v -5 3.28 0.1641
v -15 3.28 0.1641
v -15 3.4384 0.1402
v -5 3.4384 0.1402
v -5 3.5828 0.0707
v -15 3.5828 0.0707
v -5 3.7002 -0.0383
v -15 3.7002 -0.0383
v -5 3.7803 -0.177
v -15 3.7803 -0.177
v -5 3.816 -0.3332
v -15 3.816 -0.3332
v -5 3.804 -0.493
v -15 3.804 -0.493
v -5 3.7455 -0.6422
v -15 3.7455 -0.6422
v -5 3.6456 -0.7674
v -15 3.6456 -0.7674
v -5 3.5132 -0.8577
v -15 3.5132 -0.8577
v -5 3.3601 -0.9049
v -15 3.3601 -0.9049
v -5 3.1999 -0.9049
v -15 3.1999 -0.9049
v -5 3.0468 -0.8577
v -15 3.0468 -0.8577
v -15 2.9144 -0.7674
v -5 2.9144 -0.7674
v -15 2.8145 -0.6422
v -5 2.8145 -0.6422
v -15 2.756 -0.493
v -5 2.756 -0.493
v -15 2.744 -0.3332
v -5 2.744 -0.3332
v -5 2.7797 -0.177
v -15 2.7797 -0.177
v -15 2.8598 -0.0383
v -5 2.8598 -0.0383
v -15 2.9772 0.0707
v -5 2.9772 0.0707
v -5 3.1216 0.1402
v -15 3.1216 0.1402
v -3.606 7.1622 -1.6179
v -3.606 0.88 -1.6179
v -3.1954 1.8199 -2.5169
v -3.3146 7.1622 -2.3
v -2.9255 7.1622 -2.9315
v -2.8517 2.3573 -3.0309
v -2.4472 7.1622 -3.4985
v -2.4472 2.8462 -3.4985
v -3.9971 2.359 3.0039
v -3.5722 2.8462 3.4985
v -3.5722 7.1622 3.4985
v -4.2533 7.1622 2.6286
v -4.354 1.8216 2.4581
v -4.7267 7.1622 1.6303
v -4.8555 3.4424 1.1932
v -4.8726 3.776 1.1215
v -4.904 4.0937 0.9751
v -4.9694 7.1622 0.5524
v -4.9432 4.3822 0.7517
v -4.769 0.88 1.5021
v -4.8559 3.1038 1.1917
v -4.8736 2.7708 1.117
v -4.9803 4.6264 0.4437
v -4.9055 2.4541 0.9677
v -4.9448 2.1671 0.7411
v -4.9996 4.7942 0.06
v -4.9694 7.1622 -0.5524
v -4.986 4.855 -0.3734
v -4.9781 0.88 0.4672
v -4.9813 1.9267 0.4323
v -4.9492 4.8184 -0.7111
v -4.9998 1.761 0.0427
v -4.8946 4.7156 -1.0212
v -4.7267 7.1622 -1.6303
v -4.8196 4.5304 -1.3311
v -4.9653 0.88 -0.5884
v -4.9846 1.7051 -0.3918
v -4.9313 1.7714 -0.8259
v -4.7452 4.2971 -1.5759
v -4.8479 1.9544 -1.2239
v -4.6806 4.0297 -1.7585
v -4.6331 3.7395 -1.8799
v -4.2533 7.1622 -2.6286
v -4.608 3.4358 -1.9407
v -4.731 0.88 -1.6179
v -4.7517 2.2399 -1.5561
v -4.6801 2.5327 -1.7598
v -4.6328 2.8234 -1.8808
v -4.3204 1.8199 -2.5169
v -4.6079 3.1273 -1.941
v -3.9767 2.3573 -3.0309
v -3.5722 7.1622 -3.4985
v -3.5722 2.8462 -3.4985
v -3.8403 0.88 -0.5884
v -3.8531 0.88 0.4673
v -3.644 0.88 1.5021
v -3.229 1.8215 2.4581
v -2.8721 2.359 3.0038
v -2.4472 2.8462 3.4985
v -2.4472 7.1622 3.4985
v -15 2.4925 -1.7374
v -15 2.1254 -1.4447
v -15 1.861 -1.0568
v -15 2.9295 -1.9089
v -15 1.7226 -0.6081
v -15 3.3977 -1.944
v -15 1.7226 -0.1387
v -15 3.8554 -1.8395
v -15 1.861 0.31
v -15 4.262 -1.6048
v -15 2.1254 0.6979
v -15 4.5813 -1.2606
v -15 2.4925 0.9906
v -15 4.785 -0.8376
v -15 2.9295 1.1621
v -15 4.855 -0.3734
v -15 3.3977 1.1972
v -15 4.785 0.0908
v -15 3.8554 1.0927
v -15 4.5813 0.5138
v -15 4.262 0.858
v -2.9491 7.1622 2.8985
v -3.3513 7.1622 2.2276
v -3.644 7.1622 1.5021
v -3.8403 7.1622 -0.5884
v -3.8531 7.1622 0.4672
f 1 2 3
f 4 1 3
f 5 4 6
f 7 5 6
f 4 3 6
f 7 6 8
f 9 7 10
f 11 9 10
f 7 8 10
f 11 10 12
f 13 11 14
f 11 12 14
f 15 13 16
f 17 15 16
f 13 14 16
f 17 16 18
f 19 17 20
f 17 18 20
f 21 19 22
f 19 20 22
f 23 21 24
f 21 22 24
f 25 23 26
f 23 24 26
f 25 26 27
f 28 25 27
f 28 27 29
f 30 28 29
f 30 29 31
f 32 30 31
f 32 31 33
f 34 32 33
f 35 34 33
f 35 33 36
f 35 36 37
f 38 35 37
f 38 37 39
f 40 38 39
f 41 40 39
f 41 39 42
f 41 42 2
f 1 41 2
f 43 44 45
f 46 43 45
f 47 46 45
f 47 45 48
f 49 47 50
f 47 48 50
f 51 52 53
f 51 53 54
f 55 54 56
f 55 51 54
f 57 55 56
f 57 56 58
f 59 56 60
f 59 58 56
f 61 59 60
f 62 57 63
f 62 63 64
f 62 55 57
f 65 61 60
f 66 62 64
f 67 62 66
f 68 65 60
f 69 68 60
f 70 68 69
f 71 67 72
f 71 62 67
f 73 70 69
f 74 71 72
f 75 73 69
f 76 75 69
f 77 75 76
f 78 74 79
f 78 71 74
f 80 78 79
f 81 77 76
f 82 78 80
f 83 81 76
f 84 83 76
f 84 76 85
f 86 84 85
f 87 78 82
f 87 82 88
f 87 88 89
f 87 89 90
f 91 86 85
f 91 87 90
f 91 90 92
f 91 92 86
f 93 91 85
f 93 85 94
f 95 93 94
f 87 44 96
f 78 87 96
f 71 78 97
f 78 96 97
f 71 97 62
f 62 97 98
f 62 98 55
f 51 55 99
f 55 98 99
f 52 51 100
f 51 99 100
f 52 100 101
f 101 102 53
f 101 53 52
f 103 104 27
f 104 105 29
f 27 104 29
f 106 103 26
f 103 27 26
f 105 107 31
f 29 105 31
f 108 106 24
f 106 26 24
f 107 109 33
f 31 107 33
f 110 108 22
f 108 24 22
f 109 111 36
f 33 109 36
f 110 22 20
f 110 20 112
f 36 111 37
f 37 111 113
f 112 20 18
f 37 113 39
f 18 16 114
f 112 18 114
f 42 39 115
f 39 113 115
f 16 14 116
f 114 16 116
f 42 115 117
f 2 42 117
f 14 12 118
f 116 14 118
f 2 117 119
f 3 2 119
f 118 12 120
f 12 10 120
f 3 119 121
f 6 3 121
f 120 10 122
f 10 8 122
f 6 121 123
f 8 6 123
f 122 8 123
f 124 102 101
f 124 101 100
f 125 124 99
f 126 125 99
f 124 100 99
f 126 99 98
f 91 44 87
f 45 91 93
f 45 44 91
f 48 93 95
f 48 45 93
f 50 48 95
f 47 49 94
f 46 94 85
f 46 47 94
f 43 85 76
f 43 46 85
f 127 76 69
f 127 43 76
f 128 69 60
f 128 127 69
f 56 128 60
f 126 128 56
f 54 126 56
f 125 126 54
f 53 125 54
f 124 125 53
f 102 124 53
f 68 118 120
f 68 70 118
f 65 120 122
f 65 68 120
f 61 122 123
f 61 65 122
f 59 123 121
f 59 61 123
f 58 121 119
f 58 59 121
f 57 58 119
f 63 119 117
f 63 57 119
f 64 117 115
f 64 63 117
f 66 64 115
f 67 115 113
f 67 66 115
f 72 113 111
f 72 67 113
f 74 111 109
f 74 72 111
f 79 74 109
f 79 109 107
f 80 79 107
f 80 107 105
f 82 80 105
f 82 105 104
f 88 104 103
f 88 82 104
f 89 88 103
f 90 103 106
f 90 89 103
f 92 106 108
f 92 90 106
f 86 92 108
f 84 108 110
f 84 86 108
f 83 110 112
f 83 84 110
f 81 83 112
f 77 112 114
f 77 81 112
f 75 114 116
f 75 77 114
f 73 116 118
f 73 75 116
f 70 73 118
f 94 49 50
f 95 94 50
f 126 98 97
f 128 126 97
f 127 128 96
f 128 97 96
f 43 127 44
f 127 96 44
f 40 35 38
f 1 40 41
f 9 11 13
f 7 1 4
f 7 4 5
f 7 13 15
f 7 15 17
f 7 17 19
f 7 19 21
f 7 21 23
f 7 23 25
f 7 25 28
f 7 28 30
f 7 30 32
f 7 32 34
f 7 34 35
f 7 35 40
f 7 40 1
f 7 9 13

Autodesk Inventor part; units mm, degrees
ref_plane "YZ Plane" through (0, 0, 0) normal (1, 0, 0) x (0, 1, 0)
ref_plane "XZ Plane" through (0, 0, 0) normal (0, 1, 0) x (-1, 0, 0)
ref_plane "XY Plane" through (0, 0, 0) normal (0, 0, 1) x (1, 0, 0)
sketch "Sketch1" plane through (0, 0, 0) normal (0, 1, 0) x (-1, 0, 0)
  arc A0 (0, -5) -> (0, 5) centre (0, 0) ccw
  line L0 (0, 5) -> (0, -5)
  dimension "d0" = 10
extrude "Extrusion1" add sketch "Sketch1" along normal blind 10
sketch "Sketch2" plane through (0, 0, 0) normal (1, 0, 0) x (0, 1, 0)
  line L0 (8.0172, -4.5) -> (8.0172, 4.5)
  line L1 (8.0172, 4.5) -> (2.5172, 4.5)
  line L2 (2.5172, -4.5) -> (0.0172, -2)
  line L3 (2.5172, 4.5) -> (0.0172, 2)
  line L4 (0.0172, -2) -> (0.0172, 2)
  line L5 (8.0172, -4.5) -> (2.5172, -4.5)
  point P0 (0, 0)
  dimension "d3" = 9
  dimension "d4" = 8
sketch "Sketch3" plane through (0, 0, 0) normal (1, 0, 0) x (0, 1, 0)
  line L0 (0, 2) -> (3, 5)
  arc A0 (3, 5) -> (0, 2) centre (1, 4) ccw
  line L1 (0, -2) -> (4, -6)
  arc A1 (0, -2) -> (4, -6) centre (1.75, -4.25) ccw
  line L2 (8.0325, 5) -> (11, 5)
  line L3 (11, 5) -> (11, -6)
  line L4 (11, -6) -> (8.0325, -6)
  line L5 (8.0325, -6) -> (8.0325, 5)
  line L6 (2.4911, 4.4911) -> (5, 7)
  line L7 (2.4911, 4.4911) -> (8.0325, 4.4911)
  arc A2 (8.0325, 4.4911) -> (5, 7) centre (7, 6.3303) ccw
  line L8 (2.4911, -4.4911) -> (8.5706, -4.4911)
  arc A3 (2.4911, -4.4911) -> (8.5706, -4.4911) centre (5.5309, -7.5041) ccw
  point P0 (0, 0)
extrude "Extrusion2" cut sketch "Sketch3" against normal through all
sketch "Sketch4" plane through (0, 0, 0) normal (0, 1, 0) x (-1, 0, 0)
  arc A0 (1.0726, -4.4911) -> (1.0726, 4.4911) centre (-1.125, 0) ccw
  arc A1 (1.0726, 4.4911) -> (1.0726, -4.4911) centre (-0.4517, 0) ccw
  point P0 (0, 0)
  point P1 (2.1976, -4.4911)
  point P2 (2.1976, 4.4911)
  dimension "d9" = 1.125
  dimension "d10" = 1.125
extrude "Extrusion3" cut sketch "Sketch4" along normal through all both and the other way through all
sketch "Sketch5" plane through (0, 0, 0) normal (1, 0, 0) x (0, 1, 0)
  line L0 (0.88, -1.6179) -> (0.88, 1.5021)
  line L1 (7.1622, 3.4985) -> (2.8462, 3.4985)
  line L2 (7.1622, -3.4985) -> (7.1622, 3.4985)
  line L3 (7.1622, -3.4985) -> (2.8462, -3.4985)
  line L4 (0, 2) -> (0, -2) projected
  line L5 (8.0325, 4.4911) -> (8.0325, -4.4911) projected
  line L6 (0, 2) -> (2.4911, 4.4911) projected
  line L7 (2.4911, 4.4911) -> (8.0325, 4.4911) projected
  line L8 (8.0325, 4.4911) -> (8.0325, -4.4911) projected
  line L9 (8.0325, -4.4911) -> (2.4911, -4.4911) projected
  line L10 (2.4911, -4.4911) -> (0, -2) projected
  line L11 (0, 2) -> (0, -2) projected
  line L12 (0.88, 1.5021) -> (2.8462, 3.4985)
  line L13 (0.88, -1.6179) -> (2.8462, -3.4985)
  line L14 (0.88, 6.0552) -> (0.88, -6.997)
  arc A0 (0.88, 6.0552) -> (0.88, -6.997) centre (3.0168, -0.4709) ccw
  line L15 (0.88, 1.5021) -> (5.9184, 6.6178)
  line L16 (0.88, 1.5021) -> (0.88, 9.8799)
  arc A1 (5.9184, 6.6178) -> (0.88, 9.8799) centre (3.8488, 8.9433) ccw
  line L17 (2.8462, 3.4985) -> (14.9244, 3.4985)
  line L18 (2.8462, 3.4985) -> (9.8914, 10.6517)
  arc A2 (14.9244, 3.4985) -> (9.8914, 10.6517) centre (9.6254, 5.1173) ccw
  line L19 (7.1622, 3.4985) -> (16.5233, 3.4985)
  line L20 (7.1622, 3.4985) -> (7.1622, -12.1727)
  arc A3 (7.1622, -12.1727) -> (16.5233, 3.4985) centre (7.081, -1.4927) ccw
  line L21 (7.1622, -3.4985) -> (7.1622, -15.0508)
  line L22 (7.1622, -3.4985) -> (2.8462, -3.4985)
  line L23 (2.8462, -3.4985) -> (3.0168, -16.7137)
  arc A4 (3.0168, -16.7137) -> (7.1622, -12.1727) centre (6.096, -15.362) ccw
  line L24 (0.88, -1.6179) -> (0.88, -10.6889)
  line L25 (0.88, -1.6179) -> (2.8462, -3.4985)
  line L26 (2.8462, -3.4985) -> (2.953, -11.7746)
  arc A5 (0.88, -10.6889) -> (2.953, -11.7746) centre (2.2295, -10.6341) ccw
  point P0 (0, 0)
  dimension "d16" = 0.88
  dimension "d18" = 0.8703
  dimension "d21" = 0.9927
  dimension "d23" = 0.9927
  dimension "d24" = 3.12
  dimension "d26" = 4.316
  dimension "d27" = 4.316
extrude "Extrusion4" cut sketch "Sketch5" against normal through all contours L14 L10 L4 L6 L0 | L13 L23 L9 L10 L14 | L14 L6 L7 L15 L12 | L3 L20 L9 L23 | L14 A0 L6 L4 L10 | L10 L9 L23 A5 L24 L14 | L15 L7 L5 L17 L1 | L14 L16 A1 L18 L15 L7 L6 | L2 L17 L5 L9 L20 | L9 L20 A4 L23 | L15 A1 L18 A2 L17 L5 L7 | L9 L5 L17 L19 A3 L20 | L18 A1
sketch "Sketch6" plane through (0, 0, 0) normal (1, 0, 0) x (0, 1, 0)
  circle A0 centre (3.28, -0.3734) radius 1.575
  line L0 (0.88, -1.6179) -> (0.88, 1.5021) projected
  point P0 (0, 0)
  dimension "d31" = 3.15
  dimension "d32" = 2.4
extrude "Extrusion5" add sketch "Sketch6" against normal blind 15
sketch "Sketch7" plane through (0, 0, 0) normal (0, 1, 0) x (-1, 0, 0)
  arc A0 (2.4472, -3.4985) -> (3.606, -1.6179) centre (-1.125, 0) ccw projected
  arc A1 (3.644, 1.5021) -> (2.4472, 3.4985) centre (-1.125, 0) ccw projected
  arc A2 (3.606, -1.6179) -> (3.644, 1.5021) centre (-1.125, 0) ccw
  arc A3 (2.4472, 3.4985) -> (2.4472, -3.4985) centre (2.4472, 0) ccw
  point P0 (0, 0)
extrude "Extrusion6" cut sketch "Sketch7" along normal through all
sketch "Sketch8" plane through (-15, 3.28, -0.3734) normal (-1, 0, 0) x (0, 0, 1)
  circle A0 centre (0, 0) radius 0.5375
  point P0 (0.3734, -3.28)
  dimension "d37" = 1.075
extrude "Extrusion7" cut sketch "Sketch8" against normal blind 10
properties part number "10mm_radius_labmaker_cSkull_mold_window_stabilizer_surface_bigger_May1519"
